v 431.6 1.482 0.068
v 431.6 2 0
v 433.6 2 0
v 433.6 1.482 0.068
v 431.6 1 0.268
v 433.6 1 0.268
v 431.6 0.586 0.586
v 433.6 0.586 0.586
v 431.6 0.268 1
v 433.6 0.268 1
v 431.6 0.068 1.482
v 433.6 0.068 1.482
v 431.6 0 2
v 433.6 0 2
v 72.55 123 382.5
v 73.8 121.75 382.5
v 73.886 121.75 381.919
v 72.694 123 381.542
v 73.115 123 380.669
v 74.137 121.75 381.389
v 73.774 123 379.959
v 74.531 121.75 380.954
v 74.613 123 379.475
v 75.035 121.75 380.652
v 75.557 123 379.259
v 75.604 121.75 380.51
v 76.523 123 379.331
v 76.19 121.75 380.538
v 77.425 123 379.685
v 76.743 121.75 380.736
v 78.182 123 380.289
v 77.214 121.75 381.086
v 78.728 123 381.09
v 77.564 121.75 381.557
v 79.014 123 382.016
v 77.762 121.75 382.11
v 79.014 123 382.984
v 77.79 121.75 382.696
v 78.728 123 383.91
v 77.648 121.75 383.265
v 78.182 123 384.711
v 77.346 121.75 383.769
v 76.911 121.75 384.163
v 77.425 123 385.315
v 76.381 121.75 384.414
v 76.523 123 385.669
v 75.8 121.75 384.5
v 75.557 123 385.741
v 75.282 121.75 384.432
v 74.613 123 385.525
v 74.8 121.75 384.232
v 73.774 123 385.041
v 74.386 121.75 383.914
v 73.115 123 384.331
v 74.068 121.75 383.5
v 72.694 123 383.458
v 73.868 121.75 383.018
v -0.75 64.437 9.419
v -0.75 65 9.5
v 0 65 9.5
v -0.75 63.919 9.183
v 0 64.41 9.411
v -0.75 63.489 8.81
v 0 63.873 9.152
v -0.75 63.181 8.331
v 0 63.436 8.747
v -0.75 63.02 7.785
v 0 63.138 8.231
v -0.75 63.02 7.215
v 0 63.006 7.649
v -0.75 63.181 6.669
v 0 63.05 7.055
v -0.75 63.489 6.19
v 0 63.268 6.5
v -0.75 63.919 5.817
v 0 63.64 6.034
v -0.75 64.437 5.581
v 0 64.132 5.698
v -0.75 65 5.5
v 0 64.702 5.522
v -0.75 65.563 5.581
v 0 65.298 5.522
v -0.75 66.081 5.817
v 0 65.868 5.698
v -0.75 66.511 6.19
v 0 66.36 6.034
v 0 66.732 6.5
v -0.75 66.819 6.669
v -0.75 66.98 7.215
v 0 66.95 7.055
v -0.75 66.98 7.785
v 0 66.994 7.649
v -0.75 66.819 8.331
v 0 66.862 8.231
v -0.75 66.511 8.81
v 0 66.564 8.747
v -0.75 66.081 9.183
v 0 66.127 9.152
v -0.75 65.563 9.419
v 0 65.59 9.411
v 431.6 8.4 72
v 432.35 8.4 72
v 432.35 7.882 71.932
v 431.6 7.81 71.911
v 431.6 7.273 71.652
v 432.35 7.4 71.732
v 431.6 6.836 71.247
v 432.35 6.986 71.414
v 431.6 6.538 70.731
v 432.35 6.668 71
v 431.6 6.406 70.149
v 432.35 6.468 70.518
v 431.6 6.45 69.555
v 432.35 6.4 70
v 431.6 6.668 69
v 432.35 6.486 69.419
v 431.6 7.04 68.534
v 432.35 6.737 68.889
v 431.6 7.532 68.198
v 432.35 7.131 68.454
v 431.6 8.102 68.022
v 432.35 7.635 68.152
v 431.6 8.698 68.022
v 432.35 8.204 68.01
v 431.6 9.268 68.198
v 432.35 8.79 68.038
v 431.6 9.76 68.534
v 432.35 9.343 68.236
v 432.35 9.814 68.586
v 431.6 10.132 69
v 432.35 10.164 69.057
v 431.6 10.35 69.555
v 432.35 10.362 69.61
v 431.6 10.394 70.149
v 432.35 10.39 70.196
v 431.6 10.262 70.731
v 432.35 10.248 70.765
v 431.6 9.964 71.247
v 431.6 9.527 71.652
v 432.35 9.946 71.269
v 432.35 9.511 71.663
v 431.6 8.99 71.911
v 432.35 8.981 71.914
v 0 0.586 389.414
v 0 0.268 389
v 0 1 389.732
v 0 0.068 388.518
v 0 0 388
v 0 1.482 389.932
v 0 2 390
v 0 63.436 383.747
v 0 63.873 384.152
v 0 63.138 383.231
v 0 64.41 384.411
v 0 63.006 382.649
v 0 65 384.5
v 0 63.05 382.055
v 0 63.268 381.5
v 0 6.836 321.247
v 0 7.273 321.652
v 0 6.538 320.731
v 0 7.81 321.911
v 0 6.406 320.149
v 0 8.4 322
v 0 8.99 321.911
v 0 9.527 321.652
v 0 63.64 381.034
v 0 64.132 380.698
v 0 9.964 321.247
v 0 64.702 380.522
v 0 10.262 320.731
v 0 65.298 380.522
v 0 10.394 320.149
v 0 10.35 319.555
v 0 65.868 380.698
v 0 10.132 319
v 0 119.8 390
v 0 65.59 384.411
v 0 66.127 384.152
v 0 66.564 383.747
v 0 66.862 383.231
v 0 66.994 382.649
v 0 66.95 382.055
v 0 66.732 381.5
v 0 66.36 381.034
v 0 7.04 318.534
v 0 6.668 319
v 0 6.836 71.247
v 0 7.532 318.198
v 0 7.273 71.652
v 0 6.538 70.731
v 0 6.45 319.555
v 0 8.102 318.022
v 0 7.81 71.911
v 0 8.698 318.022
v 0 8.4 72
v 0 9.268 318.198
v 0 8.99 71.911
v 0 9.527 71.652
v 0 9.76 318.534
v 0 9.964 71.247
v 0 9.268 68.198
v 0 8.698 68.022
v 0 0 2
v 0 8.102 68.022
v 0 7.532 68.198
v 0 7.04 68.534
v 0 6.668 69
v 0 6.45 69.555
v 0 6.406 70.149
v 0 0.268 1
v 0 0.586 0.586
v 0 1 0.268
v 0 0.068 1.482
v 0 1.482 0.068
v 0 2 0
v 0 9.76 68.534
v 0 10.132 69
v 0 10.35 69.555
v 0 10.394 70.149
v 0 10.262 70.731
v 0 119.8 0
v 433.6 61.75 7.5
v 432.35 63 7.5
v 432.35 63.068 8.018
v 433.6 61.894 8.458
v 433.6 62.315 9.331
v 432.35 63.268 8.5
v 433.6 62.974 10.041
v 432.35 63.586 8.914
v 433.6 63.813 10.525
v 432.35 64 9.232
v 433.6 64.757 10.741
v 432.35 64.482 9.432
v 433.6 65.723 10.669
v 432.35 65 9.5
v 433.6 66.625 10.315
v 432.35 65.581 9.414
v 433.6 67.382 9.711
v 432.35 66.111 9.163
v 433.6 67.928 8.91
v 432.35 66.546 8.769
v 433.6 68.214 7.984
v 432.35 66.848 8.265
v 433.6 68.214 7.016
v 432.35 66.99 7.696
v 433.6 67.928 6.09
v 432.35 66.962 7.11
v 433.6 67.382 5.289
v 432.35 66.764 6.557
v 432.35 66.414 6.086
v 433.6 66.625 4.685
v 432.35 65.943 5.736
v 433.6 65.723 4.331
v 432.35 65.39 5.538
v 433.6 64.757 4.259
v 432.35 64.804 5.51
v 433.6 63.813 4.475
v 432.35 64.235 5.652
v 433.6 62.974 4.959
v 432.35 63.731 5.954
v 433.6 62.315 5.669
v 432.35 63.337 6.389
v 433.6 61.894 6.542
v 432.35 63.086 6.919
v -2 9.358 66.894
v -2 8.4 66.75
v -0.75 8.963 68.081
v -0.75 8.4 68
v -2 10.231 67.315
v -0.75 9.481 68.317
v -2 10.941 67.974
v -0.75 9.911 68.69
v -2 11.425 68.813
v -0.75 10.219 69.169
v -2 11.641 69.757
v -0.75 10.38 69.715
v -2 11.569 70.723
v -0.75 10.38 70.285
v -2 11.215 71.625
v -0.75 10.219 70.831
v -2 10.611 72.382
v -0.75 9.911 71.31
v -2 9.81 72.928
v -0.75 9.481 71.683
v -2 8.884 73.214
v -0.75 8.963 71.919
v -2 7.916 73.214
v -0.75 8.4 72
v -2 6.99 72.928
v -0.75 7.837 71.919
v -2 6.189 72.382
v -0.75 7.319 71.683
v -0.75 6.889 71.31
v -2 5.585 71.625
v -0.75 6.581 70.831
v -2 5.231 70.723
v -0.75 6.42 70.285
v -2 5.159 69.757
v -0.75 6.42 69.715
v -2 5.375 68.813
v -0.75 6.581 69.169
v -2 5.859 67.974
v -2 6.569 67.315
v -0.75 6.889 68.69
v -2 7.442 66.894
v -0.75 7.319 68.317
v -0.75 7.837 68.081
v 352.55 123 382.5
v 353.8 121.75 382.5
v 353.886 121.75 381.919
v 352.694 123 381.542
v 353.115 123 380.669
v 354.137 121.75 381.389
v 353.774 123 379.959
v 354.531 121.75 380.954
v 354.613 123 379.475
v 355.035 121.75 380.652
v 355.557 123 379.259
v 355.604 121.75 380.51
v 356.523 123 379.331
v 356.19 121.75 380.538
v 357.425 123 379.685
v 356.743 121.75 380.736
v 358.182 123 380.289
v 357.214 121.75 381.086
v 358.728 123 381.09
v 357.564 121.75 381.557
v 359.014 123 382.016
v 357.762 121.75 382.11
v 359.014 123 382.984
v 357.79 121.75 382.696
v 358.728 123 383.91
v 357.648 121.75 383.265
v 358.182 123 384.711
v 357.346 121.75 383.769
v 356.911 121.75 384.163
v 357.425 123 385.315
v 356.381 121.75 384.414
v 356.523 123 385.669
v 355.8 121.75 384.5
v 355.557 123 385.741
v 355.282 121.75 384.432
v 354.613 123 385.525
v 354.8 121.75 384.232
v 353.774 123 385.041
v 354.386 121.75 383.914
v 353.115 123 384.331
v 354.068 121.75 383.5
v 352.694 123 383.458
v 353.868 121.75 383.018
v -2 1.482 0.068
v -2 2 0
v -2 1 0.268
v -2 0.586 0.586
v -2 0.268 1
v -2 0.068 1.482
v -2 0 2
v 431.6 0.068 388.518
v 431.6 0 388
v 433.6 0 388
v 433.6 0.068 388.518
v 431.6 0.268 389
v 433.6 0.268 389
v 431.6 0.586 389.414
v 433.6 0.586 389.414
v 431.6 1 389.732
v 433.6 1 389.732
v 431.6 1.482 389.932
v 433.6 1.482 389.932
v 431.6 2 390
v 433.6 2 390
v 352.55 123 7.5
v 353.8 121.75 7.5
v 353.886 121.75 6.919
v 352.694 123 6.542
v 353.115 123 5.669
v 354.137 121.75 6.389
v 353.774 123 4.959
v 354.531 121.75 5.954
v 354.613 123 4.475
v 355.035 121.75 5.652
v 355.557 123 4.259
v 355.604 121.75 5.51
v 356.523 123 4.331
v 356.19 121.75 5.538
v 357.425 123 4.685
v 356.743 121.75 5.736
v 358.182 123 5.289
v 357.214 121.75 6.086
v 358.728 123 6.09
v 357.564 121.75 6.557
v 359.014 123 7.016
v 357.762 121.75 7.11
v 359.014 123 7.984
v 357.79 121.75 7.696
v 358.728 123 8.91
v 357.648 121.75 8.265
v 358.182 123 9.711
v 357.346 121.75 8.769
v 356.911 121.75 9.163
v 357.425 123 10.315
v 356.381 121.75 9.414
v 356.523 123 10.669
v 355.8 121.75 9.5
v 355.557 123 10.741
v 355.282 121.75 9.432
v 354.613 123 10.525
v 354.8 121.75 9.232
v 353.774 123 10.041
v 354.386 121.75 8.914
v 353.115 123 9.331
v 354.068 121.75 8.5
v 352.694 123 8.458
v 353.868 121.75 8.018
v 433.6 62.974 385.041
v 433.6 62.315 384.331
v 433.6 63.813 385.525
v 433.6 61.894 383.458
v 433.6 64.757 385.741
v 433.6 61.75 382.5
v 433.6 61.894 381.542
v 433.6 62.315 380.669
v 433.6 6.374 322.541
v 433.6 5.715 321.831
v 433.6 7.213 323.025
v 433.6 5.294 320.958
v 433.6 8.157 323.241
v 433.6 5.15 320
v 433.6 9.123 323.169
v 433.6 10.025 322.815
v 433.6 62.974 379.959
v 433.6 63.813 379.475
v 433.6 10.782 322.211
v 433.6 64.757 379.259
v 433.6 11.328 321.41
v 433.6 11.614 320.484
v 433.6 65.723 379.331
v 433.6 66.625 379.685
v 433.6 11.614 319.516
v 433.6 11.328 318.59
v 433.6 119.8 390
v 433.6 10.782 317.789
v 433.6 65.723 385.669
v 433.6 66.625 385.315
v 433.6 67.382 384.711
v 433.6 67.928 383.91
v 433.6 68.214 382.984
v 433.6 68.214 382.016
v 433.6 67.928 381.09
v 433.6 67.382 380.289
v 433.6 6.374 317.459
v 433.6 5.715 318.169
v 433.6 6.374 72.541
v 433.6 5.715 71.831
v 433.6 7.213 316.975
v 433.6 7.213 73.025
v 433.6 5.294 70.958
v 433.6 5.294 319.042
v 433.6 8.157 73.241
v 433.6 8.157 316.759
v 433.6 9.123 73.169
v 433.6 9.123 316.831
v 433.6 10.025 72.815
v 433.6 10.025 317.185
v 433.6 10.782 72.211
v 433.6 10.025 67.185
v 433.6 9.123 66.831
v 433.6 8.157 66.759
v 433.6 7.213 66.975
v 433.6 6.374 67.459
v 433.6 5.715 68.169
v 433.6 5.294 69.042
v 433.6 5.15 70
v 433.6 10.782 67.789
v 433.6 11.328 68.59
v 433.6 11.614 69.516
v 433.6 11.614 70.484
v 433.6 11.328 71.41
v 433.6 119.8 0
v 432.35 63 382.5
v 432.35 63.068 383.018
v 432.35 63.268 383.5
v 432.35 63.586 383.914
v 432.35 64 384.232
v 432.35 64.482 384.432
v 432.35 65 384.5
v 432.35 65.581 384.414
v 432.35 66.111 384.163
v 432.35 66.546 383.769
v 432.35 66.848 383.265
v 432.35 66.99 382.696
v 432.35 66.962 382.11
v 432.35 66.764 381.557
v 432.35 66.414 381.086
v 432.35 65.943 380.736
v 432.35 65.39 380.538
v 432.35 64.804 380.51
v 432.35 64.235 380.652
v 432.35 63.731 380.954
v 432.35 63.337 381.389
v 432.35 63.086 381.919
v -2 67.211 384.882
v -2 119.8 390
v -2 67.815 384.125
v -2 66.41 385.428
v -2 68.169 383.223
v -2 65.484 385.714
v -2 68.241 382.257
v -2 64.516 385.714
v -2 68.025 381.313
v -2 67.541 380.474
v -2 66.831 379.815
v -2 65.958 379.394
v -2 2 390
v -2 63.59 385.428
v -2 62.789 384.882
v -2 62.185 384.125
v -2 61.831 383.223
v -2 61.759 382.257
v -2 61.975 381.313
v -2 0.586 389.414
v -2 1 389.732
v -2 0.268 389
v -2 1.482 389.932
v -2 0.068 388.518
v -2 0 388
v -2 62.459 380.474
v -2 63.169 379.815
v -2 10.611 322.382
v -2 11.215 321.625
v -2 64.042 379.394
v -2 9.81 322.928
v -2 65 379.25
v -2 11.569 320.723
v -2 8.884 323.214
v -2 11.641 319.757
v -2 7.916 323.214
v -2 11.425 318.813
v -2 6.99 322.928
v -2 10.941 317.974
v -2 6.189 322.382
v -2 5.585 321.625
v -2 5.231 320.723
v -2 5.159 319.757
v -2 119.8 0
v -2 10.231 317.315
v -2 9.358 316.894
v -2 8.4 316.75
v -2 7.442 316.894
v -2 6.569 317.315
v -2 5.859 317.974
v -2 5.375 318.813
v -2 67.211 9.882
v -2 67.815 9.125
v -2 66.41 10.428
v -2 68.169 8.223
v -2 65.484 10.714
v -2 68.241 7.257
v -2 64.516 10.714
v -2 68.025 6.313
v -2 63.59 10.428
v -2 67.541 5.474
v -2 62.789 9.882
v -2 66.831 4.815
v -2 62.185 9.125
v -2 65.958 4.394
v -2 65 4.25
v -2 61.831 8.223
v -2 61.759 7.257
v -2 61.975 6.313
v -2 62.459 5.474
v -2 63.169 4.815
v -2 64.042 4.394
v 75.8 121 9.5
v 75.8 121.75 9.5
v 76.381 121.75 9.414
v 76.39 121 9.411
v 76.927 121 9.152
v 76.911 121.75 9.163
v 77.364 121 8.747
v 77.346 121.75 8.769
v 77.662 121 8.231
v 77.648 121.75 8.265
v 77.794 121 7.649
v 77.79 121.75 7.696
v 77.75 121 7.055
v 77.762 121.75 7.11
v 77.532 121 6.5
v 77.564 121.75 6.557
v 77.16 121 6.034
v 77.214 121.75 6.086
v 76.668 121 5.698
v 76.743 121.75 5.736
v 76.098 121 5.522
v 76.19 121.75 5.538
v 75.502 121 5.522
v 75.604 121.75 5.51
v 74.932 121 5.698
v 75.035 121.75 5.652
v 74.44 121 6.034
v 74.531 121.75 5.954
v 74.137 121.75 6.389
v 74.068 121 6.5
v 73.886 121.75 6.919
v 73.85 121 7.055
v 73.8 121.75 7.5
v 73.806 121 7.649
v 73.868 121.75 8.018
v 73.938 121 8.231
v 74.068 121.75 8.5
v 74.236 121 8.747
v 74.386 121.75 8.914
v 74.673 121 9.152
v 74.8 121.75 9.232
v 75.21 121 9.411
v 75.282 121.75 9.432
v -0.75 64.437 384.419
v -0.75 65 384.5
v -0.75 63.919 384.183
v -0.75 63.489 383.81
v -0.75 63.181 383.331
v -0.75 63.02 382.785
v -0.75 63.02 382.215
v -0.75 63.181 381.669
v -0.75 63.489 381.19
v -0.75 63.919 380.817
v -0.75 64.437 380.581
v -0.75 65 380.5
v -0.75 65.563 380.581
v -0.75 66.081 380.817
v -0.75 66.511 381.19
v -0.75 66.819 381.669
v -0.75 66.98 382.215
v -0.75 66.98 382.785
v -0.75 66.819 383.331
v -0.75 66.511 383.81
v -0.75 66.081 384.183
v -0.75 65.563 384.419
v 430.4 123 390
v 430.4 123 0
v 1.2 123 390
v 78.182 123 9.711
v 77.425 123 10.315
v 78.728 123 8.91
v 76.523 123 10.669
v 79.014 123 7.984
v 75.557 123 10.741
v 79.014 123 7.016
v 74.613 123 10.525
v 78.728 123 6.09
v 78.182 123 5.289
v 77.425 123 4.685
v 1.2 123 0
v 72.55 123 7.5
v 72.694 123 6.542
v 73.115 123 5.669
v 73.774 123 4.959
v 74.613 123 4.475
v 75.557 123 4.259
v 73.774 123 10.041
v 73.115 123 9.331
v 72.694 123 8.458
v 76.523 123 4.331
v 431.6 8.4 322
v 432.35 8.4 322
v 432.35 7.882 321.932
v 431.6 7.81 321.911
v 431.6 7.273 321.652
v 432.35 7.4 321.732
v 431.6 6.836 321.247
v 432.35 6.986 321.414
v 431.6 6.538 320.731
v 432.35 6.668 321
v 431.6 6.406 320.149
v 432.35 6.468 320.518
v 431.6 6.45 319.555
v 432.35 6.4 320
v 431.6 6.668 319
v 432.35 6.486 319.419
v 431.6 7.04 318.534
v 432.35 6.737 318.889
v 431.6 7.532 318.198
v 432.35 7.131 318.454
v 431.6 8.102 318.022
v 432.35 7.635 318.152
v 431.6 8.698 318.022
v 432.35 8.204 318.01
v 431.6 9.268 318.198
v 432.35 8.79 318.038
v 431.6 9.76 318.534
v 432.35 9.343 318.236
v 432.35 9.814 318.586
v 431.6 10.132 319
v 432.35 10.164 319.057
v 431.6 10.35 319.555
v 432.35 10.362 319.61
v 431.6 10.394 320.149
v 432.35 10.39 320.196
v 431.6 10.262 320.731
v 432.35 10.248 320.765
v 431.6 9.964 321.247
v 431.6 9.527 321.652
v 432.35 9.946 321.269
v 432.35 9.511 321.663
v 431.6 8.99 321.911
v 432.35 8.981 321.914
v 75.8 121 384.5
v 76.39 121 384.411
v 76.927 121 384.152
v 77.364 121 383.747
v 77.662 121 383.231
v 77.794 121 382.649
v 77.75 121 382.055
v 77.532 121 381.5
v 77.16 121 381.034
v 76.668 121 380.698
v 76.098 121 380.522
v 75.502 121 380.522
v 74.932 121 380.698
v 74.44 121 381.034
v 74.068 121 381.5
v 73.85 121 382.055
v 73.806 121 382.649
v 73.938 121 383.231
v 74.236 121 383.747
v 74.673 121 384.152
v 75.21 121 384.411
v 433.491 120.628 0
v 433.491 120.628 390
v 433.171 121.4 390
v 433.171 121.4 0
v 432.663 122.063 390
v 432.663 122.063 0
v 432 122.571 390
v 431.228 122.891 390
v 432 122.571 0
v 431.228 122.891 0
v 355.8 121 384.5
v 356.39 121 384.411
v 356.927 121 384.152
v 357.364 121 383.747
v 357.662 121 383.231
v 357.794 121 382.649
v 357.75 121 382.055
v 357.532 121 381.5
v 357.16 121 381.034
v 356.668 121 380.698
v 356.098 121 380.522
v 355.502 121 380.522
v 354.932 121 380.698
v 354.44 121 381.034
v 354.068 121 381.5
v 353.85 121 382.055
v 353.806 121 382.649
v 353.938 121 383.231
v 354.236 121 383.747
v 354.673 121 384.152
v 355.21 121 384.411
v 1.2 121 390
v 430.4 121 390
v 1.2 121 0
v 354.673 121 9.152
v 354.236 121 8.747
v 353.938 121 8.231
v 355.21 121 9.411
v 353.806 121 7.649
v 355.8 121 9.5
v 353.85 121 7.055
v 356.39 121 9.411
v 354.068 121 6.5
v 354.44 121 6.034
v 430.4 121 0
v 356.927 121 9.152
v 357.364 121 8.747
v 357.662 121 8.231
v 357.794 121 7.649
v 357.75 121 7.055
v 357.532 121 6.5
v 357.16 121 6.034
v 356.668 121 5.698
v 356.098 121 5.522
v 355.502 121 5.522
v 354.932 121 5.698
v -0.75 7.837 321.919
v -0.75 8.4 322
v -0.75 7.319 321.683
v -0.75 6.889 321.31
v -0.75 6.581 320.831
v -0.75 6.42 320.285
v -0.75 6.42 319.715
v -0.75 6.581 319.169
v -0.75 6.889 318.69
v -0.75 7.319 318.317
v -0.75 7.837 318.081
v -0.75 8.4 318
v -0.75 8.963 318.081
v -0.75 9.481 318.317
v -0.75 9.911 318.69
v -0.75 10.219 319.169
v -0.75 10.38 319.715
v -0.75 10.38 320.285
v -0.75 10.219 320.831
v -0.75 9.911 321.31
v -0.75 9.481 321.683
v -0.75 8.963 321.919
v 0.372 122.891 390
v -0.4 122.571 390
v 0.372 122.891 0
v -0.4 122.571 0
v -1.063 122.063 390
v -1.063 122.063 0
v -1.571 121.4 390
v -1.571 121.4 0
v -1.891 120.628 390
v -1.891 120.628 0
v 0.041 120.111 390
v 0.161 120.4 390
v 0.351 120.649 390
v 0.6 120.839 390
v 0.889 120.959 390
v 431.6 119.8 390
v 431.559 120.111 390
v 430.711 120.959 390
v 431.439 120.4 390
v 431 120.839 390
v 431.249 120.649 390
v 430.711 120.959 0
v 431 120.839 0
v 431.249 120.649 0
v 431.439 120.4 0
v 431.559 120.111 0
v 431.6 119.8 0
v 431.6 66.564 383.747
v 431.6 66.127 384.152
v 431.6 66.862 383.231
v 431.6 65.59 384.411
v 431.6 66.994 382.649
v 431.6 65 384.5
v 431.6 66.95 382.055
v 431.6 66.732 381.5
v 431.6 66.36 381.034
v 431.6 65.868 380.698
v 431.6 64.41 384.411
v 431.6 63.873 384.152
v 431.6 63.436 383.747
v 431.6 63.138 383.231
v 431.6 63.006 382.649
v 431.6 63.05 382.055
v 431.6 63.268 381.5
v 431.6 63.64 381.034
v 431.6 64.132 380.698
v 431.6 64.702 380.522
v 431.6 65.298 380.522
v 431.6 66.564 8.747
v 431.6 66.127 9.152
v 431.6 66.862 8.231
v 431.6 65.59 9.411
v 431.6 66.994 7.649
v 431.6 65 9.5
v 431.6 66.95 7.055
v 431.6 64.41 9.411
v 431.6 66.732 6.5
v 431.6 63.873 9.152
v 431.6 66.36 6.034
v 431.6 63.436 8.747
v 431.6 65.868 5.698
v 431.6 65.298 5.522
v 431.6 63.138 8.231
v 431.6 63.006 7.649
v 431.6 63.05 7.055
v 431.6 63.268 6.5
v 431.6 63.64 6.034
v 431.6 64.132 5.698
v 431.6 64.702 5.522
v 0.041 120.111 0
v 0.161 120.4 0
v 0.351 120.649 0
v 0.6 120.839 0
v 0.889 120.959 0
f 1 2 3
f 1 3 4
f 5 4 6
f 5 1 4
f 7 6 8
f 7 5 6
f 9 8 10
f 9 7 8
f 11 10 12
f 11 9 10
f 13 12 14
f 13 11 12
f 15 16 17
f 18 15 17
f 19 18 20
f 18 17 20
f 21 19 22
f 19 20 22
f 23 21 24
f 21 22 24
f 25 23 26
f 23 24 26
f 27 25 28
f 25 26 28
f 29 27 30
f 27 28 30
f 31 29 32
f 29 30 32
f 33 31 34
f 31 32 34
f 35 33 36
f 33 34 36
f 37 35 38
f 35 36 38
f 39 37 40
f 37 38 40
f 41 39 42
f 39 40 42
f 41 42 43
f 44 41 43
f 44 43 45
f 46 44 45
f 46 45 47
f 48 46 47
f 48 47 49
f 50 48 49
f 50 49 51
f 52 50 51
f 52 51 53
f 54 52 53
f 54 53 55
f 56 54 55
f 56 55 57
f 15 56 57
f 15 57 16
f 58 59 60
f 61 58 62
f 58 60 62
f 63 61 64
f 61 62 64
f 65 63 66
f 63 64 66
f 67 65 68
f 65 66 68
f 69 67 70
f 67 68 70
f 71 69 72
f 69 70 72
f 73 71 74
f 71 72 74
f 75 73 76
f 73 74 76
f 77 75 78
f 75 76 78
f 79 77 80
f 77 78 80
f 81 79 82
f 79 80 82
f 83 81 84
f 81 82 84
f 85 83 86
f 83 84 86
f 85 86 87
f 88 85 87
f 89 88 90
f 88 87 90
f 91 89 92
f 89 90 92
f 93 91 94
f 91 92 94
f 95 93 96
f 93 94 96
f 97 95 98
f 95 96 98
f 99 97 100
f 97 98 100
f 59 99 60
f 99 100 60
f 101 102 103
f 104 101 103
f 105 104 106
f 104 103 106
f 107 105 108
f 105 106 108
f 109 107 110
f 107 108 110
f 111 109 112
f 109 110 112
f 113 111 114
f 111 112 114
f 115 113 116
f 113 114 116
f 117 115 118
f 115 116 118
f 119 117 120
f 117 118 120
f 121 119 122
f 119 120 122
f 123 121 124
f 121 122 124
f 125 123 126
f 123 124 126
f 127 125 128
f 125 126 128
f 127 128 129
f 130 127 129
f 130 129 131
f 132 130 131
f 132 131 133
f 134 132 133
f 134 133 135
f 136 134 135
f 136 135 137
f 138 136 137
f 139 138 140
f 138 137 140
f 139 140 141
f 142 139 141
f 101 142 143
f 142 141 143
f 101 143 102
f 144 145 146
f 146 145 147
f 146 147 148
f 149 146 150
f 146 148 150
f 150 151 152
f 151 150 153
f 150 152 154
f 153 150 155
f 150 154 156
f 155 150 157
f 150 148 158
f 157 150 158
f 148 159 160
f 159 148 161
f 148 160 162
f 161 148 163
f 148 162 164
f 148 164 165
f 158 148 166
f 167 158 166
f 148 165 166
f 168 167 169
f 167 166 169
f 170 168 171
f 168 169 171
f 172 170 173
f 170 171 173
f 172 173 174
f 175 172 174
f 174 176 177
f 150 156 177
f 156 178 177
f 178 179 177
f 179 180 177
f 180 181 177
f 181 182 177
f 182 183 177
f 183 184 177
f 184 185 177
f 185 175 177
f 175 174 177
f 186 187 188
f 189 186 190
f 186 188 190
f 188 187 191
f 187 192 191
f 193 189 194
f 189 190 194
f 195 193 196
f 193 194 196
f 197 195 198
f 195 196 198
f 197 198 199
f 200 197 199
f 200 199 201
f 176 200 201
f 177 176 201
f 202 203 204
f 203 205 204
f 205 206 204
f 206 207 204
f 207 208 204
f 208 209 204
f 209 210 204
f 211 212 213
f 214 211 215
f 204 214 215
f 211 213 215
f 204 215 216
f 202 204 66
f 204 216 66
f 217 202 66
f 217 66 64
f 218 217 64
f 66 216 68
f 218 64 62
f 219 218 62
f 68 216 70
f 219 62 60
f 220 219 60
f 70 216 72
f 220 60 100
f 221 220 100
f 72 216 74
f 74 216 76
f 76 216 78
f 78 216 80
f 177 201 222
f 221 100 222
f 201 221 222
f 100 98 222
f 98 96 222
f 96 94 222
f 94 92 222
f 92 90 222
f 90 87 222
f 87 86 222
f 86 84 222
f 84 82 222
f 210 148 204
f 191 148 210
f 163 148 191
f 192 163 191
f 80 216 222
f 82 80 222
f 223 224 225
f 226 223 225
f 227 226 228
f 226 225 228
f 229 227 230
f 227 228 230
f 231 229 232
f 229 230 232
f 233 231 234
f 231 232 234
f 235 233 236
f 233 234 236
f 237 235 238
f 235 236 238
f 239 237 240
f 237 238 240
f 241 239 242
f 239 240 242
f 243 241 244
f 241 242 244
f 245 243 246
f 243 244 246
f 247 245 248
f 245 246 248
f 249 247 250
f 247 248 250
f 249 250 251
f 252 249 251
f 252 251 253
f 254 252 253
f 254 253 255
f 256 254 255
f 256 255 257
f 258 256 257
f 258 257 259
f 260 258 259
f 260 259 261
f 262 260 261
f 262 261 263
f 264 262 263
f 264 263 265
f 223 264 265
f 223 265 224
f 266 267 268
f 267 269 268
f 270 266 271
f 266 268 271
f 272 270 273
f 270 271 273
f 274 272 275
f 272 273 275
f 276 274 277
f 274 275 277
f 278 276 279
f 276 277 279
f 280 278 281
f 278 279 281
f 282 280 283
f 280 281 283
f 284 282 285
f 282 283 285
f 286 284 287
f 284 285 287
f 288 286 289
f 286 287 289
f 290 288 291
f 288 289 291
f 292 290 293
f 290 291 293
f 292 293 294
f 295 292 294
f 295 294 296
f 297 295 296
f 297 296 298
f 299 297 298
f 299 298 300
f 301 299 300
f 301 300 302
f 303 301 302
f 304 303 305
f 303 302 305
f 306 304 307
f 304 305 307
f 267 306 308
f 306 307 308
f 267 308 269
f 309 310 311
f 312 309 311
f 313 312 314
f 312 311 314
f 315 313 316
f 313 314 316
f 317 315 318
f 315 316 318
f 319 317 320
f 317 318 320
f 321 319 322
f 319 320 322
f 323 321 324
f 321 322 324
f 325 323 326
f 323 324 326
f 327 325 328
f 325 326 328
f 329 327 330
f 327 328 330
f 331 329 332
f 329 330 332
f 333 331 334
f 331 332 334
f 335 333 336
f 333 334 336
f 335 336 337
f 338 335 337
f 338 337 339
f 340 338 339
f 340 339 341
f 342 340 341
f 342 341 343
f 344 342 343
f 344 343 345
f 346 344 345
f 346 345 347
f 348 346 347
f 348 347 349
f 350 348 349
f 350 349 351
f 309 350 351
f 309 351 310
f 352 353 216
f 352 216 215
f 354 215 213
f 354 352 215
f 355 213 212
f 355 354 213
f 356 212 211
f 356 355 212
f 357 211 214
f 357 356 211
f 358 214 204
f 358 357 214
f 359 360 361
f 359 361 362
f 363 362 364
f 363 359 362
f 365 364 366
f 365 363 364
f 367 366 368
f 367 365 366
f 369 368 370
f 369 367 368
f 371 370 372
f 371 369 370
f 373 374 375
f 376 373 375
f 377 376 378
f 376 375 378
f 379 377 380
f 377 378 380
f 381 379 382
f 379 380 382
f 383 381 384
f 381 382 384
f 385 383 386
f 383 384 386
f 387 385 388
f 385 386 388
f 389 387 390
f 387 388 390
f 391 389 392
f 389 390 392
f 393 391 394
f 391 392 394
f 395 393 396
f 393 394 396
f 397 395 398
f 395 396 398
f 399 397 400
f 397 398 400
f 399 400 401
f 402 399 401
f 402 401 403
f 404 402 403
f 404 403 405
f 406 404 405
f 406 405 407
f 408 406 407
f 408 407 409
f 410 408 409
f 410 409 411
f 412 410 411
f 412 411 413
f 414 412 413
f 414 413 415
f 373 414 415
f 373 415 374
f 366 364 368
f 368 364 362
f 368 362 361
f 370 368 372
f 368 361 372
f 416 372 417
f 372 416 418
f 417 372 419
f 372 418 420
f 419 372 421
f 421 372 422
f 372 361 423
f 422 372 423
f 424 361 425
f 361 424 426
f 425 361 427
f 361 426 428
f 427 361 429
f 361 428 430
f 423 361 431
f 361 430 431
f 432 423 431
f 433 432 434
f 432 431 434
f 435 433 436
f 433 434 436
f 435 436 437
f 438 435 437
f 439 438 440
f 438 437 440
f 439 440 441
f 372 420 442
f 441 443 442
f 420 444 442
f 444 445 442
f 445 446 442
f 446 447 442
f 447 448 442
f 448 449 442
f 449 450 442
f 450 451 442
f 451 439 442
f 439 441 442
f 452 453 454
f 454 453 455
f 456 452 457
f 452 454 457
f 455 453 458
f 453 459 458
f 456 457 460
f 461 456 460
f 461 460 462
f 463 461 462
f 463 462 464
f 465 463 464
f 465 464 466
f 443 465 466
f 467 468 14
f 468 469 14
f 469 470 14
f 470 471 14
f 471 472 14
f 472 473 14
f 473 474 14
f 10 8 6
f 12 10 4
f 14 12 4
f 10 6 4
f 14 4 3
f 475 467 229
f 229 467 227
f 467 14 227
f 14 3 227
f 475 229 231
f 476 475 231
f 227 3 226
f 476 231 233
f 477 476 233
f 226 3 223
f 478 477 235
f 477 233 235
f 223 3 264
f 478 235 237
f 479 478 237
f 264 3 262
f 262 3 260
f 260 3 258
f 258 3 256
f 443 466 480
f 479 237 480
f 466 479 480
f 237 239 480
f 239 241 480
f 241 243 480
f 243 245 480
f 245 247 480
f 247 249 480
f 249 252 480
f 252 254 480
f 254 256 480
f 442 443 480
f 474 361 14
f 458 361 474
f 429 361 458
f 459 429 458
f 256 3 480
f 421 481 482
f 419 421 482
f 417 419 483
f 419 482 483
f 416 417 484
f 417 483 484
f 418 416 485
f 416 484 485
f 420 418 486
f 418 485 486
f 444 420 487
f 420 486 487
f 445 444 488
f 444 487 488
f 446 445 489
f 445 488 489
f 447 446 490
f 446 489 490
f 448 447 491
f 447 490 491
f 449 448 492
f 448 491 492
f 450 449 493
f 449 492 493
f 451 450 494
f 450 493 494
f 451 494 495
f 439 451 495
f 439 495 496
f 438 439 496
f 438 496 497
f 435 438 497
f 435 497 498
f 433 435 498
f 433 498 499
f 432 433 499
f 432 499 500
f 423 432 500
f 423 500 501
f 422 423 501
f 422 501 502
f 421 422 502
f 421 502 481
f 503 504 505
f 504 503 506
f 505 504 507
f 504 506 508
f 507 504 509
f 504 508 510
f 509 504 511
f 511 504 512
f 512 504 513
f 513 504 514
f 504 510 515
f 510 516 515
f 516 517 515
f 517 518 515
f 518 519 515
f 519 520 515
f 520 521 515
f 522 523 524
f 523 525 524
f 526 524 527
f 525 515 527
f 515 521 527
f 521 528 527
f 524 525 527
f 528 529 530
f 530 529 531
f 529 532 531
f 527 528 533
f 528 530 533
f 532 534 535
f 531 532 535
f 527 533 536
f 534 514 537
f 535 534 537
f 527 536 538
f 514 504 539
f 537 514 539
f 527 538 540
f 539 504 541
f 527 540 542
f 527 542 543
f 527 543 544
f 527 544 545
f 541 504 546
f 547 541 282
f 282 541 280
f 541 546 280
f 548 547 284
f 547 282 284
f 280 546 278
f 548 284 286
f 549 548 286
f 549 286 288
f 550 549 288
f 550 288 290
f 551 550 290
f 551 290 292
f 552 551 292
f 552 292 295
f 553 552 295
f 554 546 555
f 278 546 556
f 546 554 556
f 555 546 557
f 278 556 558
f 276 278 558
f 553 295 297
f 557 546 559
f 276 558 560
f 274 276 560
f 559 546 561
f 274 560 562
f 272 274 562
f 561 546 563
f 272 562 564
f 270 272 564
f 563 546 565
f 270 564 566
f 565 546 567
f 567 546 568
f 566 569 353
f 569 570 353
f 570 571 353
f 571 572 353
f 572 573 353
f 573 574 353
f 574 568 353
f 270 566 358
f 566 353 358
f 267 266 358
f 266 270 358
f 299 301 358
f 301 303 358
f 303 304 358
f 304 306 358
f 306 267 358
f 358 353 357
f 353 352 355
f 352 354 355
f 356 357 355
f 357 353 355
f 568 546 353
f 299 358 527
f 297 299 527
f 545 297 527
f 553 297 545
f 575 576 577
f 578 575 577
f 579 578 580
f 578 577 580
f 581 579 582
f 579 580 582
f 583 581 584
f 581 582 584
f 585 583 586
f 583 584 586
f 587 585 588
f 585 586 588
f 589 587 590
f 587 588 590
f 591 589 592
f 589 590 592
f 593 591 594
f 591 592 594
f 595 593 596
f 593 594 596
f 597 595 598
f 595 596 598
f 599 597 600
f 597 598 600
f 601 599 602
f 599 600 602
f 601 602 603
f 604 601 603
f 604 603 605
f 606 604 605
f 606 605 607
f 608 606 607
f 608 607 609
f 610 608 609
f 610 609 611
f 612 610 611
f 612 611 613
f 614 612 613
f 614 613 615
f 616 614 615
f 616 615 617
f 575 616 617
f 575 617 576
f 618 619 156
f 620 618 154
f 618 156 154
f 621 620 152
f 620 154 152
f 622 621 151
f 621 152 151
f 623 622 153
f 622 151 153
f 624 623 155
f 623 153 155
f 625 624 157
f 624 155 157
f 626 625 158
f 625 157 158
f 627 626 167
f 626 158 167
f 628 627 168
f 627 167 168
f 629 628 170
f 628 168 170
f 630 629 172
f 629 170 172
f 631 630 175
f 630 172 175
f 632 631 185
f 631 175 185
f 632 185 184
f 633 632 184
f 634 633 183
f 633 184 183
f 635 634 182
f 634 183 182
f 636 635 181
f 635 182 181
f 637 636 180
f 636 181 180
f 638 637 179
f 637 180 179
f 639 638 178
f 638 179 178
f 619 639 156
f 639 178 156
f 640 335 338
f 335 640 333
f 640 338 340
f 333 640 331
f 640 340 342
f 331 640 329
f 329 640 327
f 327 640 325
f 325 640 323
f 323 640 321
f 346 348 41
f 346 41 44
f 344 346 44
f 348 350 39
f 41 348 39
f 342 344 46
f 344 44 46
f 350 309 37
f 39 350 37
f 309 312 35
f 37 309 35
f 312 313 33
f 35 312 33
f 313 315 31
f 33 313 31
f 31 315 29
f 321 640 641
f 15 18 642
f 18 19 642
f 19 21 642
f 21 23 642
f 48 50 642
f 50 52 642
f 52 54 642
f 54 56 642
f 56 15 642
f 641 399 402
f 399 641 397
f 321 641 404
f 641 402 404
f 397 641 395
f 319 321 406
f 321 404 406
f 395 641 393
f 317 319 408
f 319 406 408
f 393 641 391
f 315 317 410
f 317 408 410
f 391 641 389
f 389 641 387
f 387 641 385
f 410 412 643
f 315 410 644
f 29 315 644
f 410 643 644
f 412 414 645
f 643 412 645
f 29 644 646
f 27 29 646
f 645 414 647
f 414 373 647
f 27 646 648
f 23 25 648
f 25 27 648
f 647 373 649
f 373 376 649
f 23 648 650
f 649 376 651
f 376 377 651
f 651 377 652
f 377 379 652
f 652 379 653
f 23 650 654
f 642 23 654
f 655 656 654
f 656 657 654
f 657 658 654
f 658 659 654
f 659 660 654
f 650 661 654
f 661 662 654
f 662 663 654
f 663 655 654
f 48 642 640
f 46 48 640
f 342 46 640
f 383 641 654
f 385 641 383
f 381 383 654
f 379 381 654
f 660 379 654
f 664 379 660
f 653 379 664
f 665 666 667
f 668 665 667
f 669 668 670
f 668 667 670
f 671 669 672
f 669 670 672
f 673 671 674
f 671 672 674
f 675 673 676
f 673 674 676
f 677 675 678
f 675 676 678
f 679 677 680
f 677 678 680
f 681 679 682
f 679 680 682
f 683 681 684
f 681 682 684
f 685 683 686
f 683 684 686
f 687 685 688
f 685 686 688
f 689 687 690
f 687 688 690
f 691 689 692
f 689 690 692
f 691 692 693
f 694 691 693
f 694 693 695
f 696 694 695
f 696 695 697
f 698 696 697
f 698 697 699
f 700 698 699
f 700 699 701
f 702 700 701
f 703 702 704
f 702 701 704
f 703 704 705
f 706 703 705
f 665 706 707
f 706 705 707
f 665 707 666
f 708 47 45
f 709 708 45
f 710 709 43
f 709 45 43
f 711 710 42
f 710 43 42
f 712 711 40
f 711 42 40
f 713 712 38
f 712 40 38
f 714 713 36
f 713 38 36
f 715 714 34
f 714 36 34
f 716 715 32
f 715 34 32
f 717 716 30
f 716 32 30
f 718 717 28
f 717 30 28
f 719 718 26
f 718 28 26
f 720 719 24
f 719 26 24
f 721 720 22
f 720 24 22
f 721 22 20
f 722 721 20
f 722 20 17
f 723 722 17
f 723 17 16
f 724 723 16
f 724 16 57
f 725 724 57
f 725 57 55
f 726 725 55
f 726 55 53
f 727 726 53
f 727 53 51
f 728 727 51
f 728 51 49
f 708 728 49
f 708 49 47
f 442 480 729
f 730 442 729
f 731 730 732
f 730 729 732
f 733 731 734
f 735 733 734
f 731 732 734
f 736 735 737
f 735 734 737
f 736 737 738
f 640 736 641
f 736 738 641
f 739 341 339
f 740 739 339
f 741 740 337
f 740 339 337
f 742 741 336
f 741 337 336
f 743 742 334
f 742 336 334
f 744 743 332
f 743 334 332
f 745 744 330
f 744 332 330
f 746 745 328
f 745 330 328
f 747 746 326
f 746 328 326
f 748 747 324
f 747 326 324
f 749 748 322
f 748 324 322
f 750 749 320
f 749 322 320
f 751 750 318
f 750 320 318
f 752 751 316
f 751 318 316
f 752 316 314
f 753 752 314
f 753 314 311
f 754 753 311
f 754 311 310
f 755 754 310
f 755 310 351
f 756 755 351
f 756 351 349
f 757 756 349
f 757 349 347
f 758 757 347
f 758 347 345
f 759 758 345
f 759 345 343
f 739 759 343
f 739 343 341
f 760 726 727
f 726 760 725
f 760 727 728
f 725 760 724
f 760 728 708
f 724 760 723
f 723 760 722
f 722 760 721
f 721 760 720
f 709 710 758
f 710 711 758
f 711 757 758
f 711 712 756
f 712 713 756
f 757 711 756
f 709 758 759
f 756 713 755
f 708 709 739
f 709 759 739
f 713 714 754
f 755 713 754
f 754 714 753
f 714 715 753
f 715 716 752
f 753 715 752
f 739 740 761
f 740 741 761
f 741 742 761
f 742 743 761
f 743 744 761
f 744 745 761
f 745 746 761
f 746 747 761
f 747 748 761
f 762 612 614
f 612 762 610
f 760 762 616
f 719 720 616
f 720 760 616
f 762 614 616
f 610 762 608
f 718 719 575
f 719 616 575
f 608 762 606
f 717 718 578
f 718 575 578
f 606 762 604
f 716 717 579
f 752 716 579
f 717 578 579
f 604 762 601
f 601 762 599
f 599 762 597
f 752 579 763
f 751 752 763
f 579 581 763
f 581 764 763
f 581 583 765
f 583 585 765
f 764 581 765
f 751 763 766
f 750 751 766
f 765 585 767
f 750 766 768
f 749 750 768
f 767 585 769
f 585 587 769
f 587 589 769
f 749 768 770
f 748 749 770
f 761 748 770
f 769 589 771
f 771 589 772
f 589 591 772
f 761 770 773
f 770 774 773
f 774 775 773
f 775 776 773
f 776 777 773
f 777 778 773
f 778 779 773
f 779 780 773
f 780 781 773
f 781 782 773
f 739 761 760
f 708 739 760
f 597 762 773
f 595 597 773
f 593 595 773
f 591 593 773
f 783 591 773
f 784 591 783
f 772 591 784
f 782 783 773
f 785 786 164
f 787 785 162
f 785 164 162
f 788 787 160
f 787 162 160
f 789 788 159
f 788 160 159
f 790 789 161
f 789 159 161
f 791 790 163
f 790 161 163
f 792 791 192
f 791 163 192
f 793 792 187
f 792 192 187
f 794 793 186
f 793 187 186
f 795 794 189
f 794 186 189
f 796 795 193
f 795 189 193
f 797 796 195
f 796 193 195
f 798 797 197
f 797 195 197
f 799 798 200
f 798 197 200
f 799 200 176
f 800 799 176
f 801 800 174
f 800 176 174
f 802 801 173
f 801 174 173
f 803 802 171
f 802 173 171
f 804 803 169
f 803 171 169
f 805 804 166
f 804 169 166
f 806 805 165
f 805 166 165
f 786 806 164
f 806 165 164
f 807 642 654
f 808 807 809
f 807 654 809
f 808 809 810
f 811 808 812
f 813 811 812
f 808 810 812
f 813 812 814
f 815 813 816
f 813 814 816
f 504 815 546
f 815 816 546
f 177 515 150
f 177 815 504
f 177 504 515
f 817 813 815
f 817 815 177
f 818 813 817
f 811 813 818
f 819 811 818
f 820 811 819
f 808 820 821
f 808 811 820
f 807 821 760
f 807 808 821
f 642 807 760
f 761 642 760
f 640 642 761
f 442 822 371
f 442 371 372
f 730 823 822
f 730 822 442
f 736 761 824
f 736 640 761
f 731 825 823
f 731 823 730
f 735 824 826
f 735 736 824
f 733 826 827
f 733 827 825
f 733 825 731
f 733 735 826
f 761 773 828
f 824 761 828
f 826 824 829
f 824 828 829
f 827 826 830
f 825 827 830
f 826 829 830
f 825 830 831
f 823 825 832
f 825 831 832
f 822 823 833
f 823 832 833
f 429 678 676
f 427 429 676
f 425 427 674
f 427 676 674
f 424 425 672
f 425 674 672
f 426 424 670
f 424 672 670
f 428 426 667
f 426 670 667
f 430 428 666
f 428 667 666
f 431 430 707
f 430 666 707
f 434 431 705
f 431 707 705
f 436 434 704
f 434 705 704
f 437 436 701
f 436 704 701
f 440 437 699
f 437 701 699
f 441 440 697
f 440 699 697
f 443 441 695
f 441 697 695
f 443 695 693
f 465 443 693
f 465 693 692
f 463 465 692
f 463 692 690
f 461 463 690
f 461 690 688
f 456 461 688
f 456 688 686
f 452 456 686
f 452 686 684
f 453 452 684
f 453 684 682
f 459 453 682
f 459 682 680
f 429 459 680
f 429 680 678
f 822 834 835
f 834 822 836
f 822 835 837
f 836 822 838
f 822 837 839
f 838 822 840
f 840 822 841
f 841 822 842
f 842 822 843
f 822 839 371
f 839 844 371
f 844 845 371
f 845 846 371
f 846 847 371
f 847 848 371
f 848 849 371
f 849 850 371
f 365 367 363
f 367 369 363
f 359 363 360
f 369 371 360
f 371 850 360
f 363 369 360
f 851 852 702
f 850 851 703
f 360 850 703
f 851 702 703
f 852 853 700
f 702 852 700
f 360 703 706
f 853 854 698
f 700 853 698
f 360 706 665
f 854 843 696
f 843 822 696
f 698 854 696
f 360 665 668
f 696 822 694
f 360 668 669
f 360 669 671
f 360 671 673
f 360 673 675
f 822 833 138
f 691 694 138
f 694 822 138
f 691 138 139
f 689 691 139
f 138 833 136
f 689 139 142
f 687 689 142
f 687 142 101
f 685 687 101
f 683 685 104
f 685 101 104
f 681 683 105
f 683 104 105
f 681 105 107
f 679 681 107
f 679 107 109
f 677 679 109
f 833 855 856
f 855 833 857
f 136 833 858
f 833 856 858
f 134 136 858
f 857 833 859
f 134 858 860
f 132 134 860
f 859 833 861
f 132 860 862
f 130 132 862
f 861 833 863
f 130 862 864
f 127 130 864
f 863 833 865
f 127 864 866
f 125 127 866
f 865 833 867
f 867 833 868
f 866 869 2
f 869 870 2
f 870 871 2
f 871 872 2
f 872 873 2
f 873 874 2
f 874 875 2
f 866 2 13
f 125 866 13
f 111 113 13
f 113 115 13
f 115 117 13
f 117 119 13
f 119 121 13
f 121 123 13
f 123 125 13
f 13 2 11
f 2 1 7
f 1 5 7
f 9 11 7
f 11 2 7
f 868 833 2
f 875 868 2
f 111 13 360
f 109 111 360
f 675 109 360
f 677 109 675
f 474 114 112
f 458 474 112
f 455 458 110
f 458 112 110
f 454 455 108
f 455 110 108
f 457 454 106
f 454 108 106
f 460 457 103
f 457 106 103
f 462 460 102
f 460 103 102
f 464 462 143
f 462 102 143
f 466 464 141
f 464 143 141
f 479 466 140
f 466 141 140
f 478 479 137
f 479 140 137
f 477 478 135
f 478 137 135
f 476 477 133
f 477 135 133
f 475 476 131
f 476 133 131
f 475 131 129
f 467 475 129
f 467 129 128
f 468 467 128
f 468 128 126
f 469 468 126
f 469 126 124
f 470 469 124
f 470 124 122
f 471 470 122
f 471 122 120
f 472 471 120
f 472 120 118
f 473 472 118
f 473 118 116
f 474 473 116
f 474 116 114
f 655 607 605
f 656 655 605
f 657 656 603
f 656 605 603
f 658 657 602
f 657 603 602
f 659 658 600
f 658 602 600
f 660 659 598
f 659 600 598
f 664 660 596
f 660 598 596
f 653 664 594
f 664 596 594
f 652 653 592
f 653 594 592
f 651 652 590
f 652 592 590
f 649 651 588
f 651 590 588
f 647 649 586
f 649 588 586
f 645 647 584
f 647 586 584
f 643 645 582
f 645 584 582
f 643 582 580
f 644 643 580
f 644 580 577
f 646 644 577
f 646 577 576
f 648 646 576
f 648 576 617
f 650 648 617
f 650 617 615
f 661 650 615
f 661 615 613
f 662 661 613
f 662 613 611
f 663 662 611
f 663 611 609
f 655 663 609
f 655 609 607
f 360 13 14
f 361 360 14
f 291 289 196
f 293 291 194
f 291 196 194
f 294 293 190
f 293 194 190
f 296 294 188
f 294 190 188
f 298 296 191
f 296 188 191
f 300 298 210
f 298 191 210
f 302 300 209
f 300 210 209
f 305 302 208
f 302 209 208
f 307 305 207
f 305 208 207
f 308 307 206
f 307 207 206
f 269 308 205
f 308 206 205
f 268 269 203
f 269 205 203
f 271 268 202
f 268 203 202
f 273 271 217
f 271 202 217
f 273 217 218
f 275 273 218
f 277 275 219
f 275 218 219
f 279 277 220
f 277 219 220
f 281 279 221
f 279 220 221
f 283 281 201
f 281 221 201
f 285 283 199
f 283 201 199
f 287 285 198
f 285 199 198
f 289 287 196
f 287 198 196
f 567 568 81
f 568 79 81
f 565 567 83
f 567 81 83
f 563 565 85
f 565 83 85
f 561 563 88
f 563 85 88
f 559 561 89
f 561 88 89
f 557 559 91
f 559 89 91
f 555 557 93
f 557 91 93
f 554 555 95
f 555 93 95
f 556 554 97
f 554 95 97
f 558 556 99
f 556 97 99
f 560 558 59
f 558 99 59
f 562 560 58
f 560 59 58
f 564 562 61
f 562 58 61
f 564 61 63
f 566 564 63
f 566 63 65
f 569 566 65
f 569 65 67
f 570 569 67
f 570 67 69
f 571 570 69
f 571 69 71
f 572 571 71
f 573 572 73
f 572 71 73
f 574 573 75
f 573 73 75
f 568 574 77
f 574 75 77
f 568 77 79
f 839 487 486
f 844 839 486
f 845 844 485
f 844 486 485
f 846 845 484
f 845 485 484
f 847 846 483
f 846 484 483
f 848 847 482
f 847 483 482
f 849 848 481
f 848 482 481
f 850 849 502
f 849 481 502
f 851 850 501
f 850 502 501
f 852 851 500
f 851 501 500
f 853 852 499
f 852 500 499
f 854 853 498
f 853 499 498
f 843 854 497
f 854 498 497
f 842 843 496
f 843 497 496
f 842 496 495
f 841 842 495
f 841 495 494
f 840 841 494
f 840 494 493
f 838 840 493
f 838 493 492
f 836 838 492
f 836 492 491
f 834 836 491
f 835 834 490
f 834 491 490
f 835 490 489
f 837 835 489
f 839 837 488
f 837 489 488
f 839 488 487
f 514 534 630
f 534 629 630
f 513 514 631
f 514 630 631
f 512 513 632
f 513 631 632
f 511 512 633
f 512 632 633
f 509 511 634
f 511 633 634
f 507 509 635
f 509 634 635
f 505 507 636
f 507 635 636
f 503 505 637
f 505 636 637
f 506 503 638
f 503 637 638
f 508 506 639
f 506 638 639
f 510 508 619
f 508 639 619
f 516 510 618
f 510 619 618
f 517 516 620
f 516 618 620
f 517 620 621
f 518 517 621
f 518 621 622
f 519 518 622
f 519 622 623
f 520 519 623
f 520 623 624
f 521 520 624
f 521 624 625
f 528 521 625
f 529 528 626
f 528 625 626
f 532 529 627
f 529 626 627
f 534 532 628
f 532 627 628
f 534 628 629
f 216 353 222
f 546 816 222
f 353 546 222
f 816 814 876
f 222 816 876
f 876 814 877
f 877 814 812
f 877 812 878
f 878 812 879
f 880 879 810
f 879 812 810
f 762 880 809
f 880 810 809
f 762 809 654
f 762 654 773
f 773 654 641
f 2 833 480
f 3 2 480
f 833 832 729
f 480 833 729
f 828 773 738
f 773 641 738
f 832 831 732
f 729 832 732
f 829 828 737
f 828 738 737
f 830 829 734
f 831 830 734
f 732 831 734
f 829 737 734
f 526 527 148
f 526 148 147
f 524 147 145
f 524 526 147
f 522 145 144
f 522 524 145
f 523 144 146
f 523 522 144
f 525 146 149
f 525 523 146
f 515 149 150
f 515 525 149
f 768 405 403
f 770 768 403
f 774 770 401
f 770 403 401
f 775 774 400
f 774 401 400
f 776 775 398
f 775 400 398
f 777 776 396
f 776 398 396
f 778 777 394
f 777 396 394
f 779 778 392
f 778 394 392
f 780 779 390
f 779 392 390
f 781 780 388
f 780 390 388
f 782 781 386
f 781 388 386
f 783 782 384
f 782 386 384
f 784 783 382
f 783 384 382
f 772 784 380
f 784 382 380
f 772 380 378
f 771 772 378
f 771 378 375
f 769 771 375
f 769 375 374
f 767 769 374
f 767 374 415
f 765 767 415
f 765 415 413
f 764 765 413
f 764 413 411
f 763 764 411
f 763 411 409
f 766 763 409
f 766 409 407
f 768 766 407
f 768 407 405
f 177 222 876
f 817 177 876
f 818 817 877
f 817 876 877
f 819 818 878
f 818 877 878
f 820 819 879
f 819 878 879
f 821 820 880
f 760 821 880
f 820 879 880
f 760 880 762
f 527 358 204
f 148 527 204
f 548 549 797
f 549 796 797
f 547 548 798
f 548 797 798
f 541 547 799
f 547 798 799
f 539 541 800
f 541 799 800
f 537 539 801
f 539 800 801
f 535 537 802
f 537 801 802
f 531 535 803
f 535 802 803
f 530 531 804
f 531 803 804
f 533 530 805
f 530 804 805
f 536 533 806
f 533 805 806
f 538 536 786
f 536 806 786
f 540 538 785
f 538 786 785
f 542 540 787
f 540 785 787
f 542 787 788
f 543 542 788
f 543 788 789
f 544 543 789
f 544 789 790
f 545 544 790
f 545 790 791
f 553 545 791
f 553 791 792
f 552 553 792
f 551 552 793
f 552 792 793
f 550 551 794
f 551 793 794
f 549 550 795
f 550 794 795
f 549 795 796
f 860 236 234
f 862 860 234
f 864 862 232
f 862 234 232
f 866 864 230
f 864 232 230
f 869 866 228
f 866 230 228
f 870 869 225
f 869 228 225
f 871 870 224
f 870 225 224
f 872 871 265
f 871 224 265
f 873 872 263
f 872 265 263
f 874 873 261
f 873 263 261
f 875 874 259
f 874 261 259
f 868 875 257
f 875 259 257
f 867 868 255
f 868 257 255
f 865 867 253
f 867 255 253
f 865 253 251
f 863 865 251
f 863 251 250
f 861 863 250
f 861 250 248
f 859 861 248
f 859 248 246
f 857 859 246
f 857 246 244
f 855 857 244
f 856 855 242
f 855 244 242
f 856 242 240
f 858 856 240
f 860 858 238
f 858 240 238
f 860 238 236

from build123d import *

# Parameters (mm, degrees)
FLANGE_BASE1_DEPTH                   = 390
ESBO_O6_R                            = 2
CORTE_EXTRUS_O1_DEPTH                = 558
ESBO_O7_R                            = 2
CORTE_EXTRUS_O2_DEPTH                = 558
QUEBRA_CANTO1_START                  = -2
QUEBRA_CANTO1_DEPTH                  = 435.6
ESCAREADO_PARA_SFHCS_M41_D           = 4
ESCAREADO_PARA_SFHCS_M41_CSINK_D     = 6.5
ESCAREADO_PARA_SFHCS_M41_CSINK_ANGLE = 90
ESCAREADO_PARA_SFHCS_M42_D           = 4
ESCAREADO_PARA_SFHCS_M42_CSINK_D     = 6.5
ESCAREADO_PARA_SFHCS_M42_CSINK_ANGLE = 90
ESCAREADO_PARA_SFHCS_M43_D           = 4
ESCAREADO_PARA_SFHCS_M43_CSINK_D     = 6.5
ESCAREADO_PARA_SFHCS_M43_CSINK_ANGLE = 90


# Read off the part's stored shape, not the designer's step: Quebra-Canto1
# Sheet-metal steps are written as plain solids
with BuildPart() as part:
    # Esboço1 → Flange-base1 (new body)
    with BuildSketch(Plane.XY):
        with BuildLine():
            Line((0, 0), (0, 119.8))
            ThreePointArc((0, 119.8), (0.351471863, 120.648528137), (1.2, 121))
            Line((1.2, 121), (430.4, 121))
            ThreePointArc((430.4, 121), (431.248528137, 120.648528137), (431.6, 119.8))
            Line((431.6, 119.8), (431.6, 0))
            Line((431.6, 0), (433.6, 0))
            Line((433.6, 0), (433.6, 119.8))
            ThreePointArc((433.6, 119.8), (432.6627417, 122.0627417), (430.4, 123))
            Line((430.4, 123), (1.2, 123))
            ThreePointArc((1.2, 123), (-1.0627417, 122.0627417), (-2, 119.8))
            Line((-2, 119.8), (-2, 0))
            Line((-2, 0), (0, 0))
        make_face()
    extrude(amount=FLANGE_BASE1_DEPTH)

    # Esboço6 → Corte-extrusão1 (cut)
    with BuildSketch(Plane(origin=(433.6, 0, 0), x_dir=(0, 0, -1), z_dir=(1, 0, 0))):
        with Locations(Location((-382.5, 65, 0), (0, 0, 180))):
            Circle(ESBO_O6_R)
        with Locations(Location((-320, 8.4, 0), (0, 0, 180))):
            Circle(ESBO_O6_R)
        with Locations(Location((-70, 8.4, 0), (0, 0, 180))):
            Circle(ESBO_O6_R)
        with Locations(Location((-7.5, 65, 0), (0, 0, 180))):
            Circle(ESBO_O6_R)
    extrude(amount=-CORTE_EXTRUS_O1_DEPTH, mode=Mode.SUBTRACT)

    # Esboço7 → Corte-extrusão2 (cut)
    with BuildSketch(Plane(origin=(0, 123, 0), x_dir=(1, 0, 0), z_dir=(0, 1, 0))):
        with Locations(Location((75.8, -7.5, 0), (0, 0, 270))):
            Circle(ESBO_O7_R)
        with Locations(Location((355.8, -7.5, 0), (0, 0, 270))):
            Circle(ESBO_O7_R)
        with Locations(Location((355.8, -382.5, 0), (0, 0, 270))):
            Circle(ESBO_O7_R)
        with Locations(Location((75.8, -382.5, 0), (0, 0, 270))):
            Circle(ESBO_O7_R)
    extrude(amount=-CORTE_EXTRUS_O2_DEPTH, mode=Mode.SUBTRACT)

    # Quebra-Canto1 outline → Quebra-Canto1 (cut)
    with BuildSketch(Plane.YZ.offset(QUEBRA_CANTO1_START)):
        with BuildLine():
            Line((0, 390), (0, 388))
            ThreePointArc((0, 388), (0.585786438, 389.414213562), (2, 390))
            Line((2, 390), (0, 390))
        make_face()
        with BuildLine():
            ThreePointArc((2, 0), (0.585786438, 0.585786438), (0, 2))
            Line((0, 2), (0, 0))
            Line((0, 0), (2, 0))
        make_face()
    extrude(amount=QUEBRA_CANTO1_DEPTH, mode=Mode.SUBTRACT)

    # Escareado para SFHCS M41 (through all)
    with Locations(Plane(origin=(0, 123, 0), x_dir=(1, 0, 0), z_dir=(0, 1, 0))):
        with Locations((75.8, -382.5), (355.8, -382.5), (355.8, -7.5), (75.8, -7.5)):
            CounterSinkHole(ESCAREADO_PARA_SFHCS_M41_D / 2, ESCAREADO_PARA_SFHCS_M41_CSINK_D / 2, counter_sink_angle=ESCAREADO_PARA_SFHCS_M41_CSINK_ANGLE)

    # Escareado para SFHCS M42 (through all)
    with Locations(Plane.ZY.offset(2)):
        with Locations((382.5, 65), (320, 8.4), (7.5, 65), (70, 8.4)):
            CounterSinkHole(ESCAREADO_PARA_SFHCS_M42_D / 2, ESCAREADO_PARA_SFHCS_M42_CSINK_D / 2, counter_sink_angle=ESCAREADO_PARA_SFHCS_M42_CSINK_ANGLE)

    # Escareado para SFHCS M43 (through all)
    with Locations(Plane(origin=(433.6, 65, 382.5), x_dir=(0, 1, 0), z_dir=(1, 0, 0))):
        with Locations((0, 0), (-56.6, -62.5), (-56.6, -312.5), (0, -375)):
            CounterSinkHole(ESCAREADO_PARA_SFHCS_M43_D / 2, ESCAREADO_PARA_SFHCS_M43_CSINK_D / 2, counter_sink_angle=ESCAREADO_PARA_SFHCS_M43_CSINK_ANGLE)


solid = part.part
